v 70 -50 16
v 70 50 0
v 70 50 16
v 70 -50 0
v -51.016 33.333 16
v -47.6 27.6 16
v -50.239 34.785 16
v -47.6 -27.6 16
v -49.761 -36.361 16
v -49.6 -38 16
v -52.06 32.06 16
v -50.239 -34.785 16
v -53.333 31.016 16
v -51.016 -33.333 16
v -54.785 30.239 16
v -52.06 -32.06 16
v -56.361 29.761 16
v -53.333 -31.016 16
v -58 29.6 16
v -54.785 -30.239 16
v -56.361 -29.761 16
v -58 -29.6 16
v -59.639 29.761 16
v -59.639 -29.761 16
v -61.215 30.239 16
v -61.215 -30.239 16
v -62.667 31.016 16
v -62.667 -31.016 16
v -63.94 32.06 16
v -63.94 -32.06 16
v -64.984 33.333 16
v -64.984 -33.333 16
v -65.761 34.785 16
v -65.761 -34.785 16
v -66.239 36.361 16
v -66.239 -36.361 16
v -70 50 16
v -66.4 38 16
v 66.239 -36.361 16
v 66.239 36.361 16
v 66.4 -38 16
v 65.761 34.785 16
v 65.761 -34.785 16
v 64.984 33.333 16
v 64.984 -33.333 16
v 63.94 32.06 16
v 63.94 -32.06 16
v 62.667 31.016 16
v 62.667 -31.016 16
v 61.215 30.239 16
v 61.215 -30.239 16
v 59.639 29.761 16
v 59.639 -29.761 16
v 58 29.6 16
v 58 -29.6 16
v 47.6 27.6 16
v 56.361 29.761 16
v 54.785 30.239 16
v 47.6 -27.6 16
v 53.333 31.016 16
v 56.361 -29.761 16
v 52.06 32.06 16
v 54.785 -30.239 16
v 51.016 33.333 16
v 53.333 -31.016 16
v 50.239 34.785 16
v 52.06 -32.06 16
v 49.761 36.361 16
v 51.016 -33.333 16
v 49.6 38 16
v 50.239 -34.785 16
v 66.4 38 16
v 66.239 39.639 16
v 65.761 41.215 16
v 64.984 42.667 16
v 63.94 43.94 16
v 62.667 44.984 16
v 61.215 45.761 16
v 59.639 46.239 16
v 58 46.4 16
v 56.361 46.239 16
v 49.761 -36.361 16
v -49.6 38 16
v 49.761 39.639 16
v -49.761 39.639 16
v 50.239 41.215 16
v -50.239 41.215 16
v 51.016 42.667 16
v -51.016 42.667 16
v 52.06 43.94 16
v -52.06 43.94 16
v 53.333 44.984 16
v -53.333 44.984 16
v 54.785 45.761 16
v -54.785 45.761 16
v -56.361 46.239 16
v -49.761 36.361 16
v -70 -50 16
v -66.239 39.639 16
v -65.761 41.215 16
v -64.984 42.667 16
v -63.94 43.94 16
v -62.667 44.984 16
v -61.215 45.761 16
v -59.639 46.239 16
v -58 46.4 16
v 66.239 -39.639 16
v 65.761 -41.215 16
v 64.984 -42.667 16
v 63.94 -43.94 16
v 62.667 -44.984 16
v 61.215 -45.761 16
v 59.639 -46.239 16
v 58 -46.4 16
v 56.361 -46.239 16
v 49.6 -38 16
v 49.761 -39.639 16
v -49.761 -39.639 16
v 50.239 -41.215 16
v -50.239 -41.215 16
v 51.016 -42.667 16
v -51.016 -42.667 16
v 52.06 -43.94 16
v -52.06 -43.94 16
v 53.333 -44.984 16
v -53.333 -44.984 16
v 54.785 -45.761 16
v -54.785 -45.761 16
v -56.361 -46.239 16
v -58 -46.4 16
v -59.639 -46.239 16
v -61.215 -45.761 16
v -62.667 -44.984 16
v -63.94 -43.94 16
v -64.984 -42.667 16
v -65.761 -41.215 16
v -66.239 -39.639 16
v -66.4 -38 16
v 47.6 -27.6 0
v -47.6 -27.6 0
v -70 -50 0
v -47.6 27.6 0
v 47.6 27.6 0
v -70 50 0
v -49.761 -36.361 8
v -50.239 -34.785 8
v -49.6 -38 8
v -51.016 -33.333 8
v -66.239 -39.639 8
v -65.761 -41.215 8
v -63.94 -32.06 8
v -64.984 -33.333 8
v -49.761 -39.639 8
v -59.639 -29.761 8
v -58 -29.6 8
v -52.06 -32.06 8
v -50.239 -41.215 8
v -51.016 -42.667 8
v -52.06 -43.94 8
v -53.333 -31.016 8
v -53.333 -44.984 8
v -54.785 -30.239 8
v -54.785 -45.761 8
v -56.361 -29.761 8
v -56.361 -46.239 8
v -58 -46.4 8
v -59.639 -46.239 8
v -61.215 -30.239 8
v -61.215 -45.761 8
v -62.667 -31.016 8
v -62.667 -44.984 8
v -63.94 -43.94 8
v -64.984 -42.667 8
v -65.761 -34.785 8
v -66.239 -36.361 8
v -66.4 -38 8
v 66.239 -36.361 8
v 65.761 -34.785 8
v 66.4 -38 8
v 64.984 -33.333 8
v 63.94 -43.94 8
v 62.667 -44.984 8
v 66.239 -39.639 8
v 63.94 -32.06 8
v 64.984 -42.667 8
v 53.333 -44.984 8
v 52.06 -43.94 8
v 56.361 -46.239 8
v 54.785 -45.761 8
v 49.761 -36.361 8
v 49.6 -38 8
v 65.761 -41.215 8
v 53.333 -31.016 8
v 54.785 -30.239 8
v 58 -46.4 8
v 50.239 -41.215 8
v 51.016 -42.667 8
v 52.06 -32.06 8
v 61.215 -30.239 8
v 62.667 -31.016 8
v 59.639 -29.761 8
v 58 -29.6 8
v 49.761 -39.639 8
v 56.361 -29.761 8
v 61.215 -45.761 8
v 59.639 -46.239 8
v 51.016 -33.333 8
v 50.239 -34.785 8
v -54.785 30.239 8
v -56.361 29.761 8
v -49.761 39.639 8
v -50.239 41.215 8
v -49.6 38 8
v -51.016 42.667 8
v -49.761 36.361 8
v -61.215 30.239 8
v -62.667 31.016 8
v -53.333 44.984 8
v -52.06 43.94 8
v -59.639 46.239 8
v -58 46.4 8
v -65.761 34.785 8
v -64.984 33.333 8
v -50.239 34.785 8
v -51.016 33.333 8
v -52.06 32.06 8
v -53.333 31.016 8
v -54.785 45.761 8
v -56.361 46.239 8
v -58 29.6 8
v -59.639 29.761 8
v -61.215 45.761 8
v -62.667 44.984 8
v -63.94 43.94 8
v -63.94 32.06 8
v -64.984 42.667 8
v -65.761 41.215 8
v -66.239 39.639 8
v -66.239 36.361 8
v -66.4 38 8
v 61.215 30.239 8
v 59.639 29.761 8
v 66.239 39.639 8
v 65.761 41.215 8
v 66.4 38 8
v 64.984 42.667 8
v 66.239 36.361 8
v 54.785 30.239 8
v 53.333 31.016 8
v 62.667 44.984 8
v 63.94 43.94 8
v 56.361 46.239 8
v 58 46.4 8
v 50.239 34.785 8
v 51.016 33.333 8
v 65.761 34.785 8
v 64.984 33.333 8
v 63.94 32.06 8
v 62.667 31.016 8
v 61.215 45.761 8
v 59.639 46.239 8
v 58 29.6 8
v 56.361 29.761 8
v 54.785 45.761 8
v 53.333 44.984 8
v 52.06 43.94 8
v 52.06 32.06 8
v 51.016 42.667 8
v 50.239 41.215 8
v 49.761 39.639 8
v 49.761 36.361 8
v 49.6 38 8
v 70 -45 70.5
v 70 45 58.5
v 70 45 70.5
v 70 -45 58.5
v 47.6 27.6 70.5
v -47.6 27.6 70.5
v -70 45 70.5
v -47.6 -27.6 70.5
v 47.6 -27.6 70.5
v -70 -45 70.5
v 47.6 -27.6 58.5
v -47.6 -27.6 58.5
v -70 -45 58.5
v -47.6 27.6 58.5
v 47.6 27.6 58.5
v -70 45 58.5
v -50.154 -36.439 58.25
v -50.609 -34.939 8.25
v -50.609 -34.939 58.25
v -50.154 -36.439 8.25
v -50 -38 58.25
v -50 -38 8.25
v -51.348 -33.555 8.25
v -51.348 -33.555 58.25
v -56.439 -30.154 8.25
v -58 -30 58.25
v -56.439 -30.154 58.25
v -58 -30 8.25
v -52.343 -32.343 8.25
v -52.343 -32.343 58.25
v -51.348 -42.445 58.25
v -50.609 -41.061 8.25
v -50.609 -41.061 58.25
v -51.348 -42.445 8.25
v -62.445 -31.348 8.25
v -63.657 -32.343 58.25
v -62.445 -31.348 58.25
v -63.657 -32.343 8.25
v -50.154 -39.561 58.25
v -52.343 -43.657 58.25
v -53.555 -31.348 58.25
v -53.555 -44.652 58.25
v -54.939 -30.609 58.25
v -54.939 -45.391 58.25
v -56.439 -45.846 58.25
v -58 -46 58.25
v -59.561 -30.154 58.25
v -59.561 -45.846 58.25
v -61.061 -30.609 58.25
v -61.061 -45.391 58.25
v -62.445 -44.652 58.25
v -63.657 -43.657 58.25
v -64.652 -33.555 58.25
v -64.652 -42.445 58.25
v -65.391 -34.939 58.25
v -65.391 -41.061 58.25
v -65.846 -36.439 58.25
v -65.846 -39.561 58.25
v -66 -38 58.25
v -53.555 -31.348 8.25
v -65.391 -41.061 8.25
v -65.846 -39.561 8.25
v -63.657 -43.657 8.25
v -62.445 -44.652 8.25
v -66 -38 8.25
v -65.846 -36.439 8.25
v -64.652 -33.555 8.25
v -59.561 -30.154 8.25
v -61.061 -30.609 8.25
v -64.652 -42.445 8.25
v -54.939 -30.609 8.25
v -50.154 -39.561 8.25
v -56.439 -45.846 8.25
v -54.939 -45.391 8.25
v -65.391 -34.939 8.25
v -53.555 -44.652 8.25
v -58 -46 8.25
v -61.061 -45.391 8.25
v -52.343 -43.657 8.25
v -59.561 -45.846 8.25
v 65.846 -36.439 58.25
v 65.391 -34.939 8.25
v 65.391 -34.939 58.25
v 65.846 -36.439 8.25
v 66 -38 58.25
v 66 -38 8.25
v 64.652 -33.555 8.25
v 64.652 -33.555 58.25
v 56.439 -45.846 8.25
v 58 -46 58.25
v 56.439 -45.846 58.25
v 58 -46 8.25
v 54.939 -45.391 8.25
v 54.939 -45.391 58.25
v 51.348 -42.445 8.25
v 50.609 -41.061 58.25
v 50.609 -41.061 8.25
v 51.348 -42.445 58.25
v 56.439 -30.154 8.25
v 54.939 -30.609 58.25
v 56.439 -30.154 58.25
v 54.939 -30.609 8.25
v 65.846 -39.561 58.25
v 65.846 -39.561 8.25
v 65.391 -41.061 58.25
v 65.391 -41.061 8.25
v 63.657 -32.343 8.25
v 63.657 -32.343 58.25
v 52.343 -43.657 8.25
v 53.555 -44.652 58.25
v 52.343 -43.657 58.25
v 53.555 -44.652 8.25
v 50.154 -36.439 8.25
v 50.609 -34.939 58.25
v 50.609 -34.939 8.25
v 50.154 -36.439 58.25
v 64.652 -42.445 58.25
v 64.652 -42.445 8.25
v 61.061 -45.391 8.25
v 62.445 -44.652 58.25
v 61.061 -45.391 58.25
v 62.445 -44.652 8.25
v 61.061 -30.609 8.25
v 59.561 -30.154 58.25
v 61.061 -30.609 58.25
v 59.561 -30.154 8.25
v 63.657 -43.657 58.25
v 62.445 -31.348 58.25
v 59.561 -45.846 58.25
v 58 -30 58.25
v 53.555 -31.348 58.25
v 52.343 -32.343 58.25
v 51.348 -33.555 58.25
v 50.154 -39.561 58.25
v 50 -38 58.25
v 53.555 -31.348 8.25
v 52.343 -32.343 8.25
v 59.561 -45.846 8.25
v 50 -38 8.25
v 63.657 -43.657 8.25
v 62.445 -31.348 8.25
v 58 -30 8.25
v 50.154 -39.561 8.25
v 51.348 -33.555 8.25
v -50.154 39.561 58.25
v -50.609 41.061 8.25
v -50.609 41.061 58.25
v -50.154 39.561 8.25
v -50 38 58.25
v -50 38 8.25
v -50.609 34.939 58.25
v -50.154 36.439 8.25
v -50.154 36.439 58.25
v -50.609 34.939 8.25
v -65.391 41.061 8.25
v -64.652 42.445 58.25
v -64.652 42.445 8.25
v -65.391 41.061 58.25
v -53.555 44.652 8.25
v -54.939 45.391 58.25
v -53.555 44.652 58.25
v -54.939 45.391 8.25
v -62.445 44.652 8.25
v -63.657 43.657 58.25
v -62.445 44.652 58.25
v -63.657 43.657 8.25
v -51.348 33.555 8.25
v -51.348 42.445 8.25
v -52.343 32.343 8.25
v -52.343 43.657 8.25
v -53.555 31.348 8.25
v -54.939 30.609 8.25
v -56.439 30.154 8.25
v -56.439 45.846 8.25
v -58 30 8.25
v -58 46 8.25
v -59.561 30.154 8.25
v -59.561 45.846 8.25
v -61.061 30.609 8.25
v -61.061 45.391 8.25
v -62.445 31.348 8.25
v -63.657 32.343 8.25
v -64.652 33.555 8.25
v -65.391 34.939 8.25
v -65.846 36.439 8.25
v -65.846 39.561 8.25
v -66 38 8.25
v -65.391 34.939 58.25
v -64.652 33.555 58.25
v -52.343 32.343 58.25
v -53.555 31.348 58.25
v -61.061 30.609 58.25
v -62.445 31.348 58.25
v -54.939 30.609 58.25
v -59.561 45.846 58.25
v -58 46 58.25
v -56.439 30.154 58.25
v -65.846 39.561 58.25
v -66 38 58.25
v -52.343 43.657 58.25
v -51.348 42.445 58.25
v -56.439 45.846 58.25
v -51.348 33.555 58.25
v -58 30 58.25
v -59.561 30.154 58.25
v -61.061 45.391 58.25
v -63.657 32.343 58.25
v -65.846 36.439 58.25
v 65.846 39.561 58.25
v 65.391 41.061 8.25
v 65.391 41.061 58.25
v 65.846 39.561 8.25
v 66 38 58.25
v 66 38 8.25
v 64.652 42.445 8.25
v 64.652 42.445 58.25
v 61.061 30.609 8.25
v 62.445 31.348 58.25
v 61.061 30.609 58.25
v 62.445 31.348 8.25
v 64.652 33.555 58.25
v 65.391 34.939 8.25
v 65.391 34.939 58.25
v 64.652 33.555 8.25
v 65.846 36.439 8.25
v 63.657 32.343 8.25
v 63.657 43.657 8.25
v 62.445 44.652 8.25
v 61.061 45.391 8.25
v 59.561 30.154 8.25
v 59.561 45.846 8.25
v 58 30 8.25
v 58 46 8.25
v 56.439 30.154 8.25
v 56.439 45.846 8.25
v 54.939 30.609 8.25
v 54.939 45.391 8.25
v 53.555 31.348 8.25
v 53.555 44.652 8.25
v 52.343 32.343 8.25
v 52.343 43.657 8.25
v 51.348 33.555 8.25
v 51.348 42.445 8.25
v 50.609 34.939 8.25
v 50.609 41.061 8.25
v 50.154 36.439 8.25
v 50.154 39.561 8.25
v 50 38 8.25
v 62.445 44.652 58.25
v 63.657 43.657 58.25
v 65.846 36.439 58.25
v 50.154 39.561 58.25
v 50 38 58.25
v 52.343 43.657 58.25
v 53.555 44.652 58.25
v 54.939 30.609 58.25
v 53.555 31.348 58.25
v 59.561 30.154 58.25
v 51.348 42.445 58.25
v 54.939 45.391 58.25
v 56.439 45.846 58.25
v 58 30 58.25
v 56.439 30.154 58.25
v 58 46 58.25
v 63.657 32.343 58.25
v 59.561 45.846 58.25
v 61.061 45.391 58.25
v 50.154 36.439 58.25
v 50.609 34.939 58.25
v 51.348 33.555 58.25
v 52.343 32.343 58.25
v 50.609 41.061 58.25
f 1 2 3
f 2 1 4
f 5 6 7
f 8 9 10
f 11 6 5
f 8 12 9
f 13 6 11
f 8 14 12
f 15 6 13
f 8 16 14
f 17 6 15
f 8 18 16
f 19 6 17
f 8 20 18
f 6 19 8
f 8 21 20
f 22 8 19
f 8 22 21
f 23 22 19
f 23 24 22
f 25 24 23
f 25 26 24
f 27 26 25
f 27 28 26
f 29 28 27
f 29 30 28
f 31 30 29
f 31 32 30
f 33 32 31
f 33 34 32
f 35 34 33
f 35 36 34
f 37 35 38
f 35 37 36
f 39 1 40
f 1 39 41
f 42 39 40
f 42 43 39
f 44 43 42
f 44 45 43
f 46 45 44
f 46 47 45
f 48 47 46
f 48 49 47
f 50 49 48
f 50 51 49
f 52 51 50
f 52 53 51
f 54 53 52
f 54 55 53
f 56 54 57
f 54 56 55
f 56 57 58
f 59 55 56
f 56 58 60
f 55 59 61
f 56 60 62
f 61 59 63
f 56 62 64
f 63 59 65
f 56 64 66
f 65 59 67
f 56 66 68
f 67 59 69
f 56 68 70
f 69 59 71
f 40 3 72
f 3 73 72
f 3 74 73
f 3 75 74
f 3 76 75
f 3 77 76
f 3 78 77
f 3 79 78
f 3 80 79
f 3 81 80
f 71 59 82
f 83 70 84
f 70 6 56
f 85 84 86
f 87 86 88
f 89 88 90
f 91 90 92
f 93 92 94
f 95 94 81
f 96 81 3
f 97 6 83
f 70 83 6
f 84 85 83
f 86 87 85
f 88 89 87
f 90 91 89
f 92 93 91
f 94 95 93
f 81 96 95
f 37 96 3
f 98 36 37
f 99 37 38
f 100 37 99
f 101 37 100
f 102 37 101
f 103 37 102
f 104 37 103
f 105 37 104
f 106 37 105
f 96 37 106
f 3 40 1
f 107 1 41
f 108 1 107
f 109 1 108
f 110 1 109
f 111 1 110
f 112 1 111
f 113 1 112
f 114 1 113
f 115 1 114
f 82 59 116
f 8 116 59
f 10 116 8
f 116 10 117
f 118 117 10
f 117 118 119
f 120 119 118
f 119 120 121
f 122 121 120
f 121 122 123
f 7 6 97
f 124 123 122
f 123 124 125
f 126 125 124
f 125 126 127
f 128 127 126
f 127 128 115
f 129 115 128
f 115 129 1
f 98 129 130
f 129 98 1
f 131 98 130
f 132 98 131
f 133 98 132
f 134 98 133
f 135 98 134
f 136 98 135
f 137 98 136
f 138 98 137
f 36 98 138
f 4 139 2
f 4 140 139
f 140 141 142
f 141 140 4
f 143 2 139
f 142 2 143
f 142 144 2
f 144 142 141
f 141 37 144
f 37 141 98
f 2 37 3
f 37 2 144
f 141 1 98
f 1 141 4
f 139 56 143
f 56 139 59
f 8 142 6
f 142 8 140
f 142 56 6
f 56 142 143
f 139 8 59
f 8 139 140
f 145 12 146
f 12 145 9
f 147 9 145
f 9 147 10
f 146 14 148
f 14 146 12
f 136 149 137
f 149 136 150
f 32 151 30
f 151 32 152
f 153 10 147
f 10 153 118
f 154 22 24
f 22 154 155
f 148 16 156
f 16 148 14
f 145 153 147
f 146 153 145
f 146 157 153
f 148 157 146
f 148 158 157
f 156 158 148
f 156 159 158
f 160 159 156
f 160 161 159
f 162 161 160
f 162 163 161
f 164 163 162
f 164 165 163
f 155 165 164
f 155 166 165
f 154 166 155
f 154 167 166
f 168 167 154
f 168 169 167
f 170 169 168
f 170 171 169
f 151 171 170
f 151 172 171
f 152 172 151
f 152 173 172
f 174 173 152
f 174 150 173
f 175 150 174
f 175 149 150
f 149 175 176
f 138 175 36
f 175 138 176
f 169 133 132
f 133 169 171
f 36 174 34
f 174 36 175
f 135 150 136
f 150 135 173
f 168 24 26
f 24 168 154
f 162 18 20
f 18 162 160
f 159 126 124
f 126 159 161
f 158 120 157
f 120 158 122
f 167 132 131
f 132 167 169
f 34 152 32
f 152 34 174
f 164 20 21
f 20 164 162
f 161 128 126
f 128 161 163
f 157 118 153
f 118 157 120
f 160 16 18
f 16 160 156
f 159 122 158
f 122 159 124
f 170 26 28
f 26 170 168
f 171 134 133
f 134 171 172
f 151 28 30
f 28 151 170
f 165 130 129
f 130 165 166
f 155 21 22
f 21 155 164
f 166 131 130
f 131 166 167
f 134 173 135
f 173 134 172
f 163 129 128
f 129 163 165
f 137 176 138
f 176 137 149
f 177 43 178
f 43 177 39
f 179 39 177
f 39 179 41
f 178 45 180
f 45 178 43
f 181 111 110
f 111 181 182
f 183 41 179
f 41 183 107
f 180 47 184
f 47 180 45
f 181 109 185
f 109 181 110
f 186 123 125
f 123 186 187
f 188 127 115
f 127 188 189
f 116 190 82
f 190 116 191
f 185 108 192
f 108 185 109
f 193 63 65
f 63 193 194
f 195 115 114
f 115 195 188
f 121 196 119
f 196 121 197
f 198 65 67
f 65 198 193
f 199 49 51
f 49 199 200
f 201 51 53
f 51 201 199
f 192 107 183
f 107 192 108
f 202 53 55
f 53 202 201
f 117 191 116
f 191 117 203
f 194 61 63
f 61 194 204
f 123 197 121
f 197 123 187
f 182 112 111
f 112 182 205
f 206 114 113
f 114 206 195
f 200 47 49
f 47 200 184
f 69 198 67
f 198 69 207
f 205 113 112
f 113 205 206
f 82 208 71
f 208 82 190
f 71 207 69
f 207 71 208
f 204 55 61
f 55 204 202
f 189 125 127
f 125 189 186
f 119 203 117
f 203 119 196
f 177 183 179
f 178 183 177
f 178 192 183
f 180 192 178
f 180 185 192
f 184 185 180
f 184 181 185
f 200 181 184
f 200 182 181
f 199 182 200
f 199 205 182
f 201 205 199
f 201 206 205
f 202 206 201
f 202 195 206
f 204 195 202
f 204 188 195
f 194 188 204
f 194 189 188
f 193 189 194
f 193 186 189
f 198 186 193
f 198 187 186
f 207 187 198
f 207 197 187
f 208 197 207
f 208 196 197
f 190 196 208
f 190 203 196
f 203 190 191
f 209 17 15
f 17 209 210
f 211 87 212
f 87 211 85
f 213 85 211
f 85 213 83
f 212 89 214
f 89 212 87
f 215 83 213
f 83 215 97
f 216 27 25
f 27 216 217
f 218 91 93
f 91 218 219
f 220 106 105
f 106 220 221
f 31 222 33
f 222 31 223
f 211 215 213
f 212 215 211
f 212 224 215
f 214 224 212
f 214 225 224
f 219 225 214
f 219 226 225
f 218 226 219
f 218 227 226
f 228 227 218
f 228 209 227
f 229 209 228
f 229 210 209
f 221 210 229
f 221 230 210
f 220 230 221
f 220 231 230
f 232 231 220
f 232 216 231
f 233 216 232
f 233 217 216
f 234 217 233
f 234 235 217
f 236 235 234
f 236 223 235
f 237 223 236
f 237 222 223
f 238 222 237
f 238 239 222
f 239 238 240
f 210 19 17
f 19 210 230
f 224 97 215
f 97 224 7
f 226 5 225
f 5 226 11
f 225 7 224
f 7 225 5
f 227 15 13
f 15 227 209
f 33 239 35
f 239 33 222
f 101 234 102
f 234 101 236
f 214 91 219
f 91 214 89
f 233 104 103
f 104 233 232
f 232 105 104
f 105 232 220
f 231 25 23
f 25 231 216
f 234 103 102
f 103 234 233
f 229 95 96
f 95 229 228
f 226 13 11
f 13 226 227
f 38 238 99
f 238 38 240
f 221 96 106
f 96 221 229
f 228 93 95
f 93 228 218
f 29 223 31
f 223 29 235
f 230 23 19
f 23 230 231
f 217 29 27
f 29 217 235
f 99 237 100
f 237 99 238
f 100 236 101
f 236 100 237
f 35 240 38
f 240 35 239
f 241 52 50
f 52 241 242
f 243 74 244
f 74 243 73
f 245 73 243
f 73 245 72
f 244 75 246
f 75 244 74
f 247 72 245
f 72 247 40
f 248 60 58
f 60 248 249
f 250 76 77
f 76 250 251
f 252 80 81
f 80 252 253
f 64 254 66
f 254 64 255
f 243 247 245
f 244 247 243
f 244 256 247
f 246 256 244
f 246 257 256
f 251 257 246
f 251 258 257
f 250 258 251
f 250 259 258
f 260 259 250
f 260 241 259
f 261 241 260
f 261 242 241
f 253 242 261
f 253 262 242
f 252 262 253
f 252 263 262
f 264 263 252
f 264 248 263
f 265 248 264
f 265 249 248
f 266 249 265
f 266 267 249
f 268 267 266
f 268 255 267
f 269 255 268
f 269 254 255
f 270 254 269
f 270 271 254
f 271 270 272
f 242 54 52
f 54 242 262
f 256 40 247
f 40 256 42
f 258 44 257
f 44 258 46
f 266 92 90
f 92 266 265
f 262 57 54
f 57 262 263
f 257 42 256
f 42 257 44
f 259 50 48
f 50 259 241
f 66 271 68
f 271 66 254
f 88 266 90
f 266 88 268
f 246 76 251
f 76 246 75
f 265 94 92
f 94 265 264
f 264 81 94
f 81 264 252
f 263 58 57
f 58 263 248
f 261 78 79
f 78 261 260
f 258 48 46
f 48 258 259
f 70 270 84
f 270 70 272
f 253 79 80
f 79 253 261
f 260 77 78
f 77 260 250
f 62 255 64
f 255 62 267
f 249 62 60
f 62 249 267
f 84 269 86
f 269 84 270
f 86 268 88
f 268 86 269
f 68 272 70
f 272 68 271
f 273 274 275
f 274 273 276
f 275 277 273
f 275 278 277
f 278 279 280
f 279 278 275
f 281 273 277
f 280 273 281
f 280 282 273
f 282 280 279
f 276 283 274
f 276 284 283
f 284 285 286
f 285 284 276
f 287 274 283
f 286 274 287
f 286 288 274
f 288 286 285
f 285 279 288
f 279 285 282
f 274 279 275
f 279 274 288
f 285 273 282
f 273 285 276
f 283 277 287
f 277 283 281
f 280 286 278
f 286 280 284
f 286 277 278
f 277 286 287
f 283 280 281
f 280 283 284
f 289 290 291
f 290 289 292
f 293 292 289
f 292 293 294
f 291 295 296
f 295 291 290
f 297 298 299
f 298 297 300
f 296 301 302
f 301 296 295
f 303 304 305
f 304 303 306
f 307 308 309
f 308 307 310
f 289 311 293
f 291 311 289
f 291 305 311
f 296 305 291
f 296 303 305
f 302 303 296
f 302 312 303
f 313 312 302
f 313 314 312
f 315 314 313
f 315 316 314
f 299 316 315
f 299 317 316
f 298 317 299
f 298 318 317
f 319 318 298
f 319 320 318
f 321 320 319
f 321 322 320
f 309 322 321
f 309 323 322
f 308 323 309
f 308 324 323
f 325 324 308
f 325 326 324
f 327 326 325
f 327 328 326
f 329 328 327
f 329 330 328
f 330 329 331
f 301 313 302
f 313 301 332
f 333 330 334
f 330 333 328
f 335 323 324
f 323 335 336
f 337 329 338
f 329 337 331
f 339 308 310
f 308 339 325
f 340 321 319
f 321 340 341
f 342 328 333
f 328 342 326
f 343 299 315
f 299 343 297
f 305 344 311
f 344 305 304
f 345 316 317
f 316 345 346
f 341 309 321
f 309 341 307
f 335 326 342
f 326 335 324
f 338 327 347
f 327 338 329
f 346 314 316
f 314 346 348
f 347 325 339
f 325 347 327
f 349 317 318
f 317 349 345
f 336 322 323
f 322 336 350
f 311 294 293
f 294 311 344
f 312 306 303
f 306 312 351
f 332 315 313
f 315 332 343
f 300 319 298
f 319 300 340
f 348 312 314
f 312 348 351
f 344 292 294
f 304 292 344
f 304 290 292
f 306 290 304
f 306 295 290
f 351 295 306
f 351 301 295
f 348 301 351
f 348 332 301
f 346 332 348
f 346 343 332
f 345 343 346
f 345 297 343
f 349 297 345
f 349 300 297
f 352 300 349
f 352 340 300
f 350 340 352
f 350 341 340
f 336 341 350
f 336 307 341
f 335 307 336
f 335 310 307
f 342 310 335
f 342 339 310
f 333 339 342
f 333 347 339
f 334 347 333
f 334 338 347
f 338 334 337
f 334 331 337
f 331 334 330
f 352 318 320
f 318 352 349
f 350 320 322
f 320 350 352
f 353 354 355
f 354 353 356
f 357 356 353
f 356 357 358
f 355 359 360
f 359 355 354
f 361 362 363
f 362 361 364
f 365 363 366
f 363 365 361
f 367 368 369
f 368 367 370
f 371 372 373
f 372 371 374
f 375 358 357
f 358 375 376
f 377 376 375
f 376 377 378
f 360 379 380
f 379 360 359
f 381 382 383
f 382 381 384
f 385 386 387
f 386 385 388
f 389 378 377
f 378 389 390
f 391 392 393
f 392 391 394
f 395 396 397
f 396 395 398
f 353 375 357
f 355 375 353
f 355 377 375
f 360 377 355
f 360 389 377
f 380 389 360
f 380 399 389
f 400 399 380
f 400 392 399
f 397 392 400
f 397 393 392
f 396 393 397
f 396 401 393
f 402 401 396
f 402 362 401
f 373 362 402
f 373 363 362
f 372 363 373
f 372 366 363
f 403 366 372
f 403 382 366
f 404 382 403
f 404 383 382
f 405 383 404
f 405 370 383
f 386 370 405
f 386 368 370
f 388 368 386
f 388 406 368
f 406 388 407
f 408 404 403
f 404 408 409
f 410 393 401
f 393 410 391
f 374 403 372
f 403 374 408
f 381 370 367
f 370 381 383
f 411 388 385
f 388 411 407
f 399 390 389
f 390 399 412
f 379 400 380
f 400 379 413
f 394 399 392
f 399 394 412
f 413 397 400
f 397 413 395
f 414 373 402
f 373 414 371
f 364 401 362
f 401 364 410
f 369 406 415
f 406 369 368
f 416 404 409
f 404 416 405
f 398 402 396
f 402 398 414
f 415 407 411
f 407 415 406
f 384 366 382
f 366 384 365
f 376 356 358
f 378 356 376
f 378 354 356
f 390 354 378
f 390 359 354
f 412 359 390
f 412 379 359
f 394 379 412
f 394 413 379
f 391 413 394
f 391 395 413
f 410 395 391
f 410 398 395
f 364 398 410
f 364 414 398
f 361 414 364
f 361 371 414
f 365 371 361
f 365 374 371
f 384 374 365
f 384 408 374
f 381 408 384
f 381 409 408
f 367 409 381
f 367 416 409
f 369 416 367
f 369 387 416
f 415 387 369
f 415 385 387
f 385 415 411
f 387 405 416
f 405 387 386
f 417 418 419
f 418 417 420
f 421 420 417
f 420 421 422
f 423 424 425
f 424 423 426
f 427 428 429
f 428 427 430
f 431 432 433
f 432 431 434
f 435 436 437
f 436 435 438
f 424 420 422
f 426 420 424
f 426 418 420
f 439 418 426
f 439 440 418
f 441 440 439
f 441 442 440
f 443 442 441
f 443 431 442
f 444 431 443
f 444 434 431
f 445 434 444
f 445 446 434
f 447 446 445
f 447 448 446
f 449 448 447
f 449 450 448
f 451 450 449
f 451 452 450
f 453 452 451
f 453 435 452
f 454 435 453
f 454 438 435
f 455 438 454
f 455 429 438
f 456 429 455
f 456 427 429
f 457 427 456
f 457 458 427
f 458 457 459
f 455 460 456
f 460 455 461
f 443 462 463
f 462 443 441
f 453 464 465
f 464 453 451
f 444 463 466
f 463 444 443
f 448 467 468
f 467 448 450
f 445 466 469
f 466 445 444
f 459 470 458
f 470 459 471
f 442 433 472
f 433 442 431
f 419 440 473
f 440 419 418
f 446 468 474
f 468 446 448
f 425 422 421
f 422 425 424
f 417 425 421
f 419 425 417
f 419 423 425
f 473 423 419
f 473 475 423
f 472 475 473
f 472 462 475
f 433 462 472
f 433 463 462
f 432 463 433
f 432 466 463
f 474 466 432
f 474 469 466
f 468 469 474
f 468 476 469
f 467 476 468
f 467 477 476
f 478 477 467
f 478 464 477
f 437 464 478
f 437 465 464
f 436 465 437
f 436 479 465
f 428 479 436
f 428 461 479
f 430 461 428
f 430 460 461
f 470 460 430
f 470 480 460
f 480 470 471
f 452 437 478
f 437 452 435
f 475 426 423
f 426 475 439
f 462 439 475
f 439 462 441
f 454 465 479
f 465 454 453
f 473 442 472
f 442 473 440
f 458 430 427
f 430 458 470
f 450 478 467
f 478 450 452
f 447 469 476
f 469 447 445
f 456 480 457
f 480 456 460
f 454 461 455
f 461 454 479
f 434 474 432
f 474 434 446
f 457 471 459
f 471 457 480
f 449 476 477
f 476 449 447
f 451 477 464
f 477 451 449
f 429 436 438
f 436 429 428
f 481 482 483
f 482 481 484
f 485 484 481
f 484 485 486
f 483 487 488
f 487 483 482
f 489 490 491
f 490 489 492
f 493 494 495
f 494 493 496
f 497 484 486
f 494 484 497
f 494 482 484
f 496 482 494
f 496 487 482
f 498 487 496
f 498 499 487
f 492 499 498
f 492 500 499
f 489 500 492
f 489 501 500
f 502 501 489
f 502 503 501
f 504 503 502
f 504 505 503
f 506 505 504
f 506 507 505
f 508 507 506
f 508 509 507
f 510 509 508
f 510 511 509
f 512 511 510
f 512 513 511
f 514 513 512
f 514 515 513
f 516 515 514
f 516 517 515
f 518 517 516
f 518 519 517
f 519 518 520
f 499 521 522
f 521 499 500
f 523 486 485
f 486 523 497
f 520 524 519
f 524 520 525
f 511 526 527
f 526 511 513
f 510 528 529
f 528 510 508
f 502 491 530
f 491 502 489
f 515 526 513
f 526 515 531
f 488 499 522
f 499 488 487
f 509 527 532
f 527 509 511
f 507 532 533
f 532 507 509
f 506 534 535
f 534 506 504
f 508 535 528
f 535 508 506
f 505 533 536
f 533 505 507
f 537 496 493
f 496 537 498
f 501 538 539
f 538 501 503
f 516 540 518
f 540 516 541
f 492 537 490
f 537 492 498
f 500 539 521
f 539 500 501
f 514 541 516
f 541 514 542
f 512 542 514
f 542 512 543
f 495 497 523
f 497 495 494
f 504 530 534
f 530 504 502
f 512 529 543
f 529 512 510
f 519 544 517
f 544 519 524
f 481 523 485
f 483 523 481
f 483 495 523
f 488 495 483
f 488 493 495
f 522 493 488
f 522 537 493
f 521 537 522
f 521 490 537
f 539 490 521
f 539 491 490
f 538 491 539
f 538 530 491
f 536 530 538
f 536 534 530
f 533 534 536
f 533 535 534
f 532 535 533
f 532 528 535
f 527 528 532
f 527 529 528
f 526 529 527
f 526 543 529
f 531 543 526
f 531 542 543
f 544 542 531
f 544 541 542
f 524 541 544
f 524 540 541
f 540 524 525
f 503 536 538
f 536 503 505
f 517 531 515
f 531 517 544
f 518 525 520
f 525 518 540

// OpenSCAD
$fn = 32;

// ------------------------------------------------------------------------
// Frame cube: base 140 x 100 mm, posts 50 mm tall
// Every part is its own module, assembly() places every instance.
// ------------------------------------------------------------------------

// --- part 1 ---
module base_frame() {
  difference() {
    translate([-70, -50, 0]) cube([140, 100, 16]);
    translate([-47.6, -27.6, -1]) cube([95.2, 55.2, 18]);
    translate([-58, -38, 8]) cylinder(h = 9, d = 16.8);
    translate([58, -38, 8]) cylinder(h = 9, d = 16.8);
    translate([-58, 38, 8]) cylinder(h = 9, d = 16.8);
    translate([58, 38, 8]) cylinder(h = 9, d = 16.8);
  }
}

// --- part 2 ---
module corner_post() {
  cylinder(h = 50, d = 16);
}

// --- part 3 ---
module top_frame() {
  difference() {
    translate([-70, -45, 0]) cube([140, 90, 12]);
    translate([-47.6, -27.6, -1]) cube([95.2, 55.2, 14]);
  }
}

// --- assembly ---
module assembly() {
  color([0.80, 0.24, 0.20]) translate([0, 0, 0]) rotate([0, 0, 0]) base_frame();
  color([0.20, 0.45, 0.75]) translate([-58, -38, 8.25]) rotate([0, 0, 0]) corner_post();
  color([0.25, 0.62, 0.32]) translate([58, -38, 8.25]) rotate([0, 0, 0]) corner_post();
  color([0.92, 0.70, 0.18]) translate([-58, 38, 8.25]) rotate([0, 0, 0]) corner_post();
  color([0.58, 0.35, 0.70]) translate([58, 38, 8.25]) rotate([0, 0, 0]) corner_post();
  color([0.16, 0.66, 0.66]) translate([0, 0, 58.5]) rotate([0, 0, 0]) top_frame();
}

assembly();
